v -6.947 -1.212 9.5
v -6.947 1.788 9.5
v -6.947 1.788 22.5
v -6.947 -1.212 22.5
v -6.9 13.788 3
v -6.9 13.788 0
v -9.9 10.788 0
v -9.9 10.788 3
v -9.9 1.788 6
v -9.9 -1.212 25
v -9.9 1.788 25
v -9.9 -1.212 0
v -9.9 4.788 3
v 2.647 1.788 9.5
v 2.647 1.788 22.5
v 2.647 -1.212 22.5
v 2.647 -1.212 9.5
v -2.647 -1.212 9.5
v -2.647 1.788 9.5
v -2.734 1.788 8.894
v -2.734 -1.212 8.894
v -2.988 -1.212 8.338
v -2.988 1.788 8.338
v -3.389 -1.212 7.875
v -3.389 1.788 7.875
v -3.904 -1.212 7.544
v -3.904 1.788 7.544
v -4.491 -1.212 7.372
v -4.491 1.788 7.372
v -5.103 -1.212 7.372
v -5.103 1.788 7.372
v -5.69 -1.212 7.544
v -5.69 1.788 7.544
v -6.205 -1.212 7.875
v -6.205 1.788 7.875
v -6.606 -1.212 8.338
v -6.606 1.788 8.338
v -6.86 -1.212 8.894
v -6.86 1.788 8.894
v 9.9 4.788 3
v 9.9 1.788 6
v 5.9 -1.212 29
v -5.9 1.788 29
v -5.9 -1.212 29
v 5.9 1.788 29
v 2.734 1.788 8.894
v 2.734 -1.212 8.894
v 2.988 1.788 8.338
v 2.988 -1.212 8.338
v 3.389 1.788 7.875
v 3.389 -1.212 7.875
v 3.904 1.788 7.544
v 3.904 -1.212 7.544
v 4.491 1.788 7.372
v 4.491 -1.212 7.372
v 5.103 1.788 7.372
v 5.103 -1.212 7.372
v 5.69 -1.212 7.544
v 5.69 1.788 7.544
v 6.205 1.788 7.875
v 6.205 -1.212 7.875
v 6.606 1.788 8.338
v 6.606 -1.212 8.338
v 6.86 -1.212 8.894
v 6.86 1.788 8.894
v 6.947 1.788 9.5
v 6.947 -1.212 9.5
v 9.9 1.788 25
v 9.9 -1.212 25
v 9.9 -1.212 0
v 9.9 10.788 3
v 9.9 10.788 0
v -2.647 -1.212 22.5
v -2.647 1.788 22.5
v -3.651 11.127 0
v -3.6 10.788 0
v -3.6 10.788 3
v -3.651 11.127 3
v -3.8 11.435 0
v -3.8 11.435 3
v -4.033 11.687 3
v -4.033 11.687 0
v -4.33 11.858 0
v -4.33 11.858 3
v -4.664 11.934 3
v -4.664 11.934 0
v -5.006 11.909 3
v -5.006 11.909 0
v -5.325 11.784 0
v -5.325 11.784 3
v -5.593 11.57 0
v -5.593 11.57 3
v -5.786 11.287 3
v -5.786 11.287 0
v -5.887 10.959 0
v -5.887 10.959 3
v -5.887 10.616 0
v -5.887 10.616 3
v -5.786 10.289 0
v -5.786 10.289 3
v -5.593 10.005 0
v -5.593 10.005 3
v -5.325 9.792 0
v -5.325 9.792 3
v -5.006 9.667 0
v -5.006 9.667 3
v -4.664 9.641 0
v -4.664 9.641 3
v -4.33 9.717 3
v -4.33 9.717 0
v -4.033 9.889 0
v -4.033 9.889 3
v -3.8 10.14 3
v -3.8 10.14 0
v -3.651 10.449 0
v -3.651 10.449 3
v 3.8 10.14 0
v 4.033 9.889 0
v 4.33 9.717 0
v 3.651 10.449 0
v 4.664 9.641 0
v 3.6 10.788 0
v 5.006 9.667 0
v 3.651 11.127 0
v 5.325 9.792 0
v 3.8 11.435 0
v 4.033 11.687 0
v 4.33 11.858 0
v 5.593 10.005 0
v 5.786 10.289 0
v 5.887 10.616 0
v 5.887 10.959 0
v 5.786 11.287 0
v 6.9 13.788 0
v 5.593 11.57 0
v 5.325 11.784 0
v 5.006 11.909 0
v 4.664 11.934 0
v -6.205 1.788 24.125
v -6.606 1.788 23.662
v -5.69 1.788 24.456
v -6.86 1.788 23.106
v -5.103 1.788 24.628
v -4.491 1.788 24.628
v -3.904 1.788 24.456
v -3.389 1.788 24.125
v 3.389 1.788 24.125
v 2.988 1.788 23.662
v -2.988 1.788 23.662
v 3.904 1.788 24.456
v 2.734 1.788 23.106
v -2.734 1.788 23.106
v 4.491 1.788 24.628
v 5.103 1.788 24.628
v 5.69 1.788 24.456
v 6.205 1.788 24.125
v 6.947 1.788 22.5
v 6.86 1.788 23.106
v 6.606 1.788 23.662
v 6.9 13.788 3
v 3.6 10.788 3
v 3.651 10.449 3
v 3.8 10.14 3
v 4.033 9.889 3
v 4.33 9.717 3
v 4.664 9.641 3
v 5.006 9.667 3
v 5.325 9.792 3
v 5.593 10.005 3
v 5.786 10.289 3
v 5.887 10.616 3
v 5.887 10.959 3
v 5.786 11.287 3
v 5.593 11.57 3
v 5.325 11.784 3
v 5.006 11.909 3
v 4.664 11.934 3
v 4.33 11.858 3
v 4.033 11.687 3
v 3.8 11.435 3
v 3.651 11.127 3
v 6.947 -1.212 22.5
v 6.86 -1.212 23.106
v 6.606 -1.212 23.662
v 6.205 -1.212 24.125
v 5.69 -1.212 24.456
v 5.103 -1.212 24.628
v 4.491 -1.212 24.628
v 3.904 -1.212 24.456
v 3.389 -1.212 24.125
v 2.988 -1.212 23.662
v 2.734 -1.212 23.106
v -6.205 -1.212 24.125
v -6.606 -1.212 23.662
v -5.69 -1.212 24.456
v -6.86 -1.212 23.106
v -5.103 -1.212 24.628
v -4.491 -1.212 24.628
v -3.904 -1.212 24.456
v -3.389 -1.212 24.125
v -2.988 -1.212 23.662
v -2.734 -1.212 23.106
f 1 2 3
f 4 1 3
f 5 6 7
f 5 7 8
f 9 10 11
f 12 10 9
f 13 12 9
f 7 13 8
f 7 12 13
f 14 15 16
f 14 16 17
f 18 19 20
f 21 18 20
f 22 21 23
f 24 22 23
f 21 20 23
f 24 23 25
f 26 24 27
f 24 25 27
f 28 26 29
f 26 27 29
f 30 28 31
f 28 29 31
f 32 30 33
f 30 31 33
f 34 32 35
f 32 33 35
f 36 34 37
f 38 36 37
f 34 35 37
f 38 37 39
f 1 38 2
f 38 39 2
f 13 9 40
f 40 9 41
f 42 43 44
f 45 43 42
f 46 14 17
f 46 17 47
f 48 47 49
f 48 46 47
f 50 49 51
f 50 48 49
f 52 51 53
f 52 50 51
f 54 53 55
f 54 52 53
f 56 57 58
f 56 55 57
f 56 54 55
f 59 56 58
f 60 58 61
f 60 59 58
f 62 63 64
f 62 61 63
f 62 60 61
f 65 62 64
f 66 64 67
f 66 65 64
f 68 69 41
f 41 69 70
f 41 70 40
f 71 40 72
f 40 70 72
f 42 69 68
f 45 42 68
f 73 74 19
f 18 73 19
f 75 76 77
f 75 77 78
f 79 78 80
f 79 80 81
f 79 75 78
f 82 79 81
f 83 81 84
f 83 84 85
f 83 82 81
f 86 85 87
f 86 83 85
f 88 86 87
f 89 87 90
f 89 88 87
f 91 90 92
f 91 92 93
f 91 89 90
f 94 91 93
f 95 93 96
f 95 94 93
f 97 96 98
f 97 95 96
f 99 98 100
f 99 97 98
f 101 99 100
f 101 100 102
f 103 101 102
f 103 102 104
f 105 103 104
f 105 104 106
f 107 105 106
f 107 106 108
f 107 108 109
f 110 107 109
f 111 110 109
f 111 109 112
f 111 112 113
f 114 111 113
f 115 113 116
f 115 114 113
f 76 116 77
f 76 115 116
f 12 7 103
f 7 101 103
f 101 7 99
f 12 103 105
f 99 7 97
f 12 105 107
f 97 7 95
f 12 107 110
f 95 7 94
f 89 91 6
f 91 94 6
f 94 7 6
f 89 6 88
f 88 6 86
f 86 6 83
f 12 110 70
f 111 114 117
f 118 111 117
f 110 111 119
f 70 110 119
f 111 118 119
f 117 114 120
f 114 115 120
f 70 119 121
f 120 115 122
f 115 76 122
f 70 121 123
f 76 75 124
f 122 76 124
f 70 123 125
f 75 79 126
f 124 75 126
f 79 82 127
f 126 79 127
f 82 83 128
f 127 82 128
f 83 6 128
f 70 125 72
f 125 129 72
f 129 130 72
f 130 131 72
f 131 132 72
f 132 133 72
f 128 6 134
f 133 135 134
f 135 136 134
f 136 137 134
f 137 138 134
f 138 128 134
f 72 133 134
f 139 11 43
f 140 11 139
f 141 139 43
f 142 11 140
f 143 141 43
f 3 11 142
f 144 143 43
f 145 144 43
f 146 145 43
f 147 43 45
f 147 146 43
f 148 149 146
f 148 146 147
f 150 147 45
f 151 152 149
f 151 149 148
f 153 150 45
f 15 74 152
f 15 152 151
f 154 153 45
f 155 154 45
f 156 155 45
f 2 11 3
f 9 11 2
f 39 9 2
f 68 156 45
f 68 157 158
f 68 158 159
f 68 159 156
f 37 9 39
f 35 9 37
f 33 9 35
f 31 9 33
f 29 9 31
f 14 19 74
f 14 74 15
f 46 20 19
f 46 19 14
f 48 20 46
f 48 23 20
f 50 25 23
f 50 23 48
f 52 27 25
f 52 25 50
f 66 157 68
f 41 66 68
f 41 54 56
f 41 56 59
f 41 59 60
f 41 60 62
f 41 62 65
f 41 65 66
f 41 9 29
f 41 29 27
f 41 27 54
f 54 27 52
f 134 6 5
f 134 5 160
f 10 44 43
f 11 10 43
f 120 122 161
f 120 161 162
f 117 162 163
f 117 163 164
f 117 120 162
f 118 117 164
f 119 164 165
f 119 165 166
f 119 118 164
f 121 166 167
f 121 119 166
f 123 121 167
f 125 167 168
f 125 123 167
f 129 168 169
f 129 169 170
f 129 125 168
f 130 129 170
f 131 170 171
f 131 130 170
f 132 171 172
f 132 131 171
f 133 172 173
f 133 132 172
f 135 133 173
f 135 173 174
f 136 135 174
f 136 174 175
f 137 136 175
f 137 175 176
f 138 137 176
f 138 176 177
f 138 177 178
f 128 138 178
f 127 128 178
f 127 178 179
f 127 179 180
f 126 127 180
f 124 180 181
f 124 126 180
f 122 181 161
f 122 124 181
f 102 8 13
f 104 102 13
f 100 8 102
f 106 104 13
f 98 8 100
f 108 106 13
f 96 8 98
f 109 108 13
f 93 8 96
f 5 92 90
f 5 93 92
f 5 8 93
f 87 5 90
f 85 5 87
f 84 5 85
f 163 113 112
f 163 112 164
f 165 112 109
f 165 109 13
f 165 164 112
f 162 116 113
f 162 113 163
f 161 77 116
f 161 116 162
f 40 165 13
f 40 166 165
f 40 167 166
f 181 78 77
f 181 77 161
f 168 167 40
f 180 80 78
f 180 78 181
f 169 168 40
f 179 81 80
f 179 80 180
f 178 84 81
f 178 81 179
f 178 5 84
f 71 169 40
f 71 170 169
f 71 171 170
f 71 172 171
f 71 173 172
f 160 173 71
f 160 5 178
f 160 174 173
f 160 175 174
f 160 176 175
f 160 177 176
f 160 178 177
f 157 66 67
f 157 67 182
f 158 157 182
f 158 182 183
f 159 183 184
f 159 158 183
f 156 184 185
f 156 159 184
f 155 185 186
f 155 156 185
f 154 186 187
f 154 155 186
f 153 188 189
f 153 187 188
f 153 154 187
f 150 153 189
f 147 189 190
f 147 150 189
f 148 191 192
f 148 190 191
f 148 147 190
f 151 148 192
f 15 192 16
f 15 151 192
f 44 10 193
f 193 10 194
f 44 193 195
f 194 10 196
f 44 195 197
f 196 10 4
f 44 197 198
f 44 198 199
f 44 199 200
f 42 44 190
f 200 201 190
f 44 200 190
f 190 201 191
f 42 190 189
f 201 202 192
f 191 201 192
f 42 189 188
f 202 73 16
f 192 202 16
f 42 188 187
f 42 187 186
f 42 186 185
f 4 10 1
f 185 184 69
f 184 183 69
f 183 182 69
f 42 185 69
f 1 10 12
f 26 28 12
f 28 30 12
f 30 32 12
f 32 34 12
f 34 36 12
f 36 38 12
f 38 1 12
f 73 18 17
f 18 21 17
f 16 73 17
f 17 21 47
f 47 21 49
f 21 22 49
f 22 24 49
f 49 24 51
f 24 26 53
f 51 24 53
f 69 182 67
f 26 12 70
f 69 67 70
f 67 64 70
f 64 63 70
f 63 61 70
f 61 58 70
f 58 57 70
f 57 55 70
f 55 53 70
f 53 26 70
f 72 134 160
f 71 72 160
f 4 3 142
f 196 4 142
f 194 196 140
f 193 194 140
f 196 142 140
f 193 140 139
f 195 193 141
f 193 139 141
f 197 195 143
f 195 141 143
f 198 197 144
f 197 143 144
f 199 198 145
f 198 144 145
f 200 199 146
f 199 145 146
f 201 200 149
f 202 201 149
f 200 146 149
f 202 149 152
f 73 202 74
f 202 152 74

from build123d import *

# Parameters (mm, degrees)
SKETCH1_W           = 19.8
SKETCH1_H           = 15
SKETCH1_R           = 1.15
BOSS_EXTRUDE1_DEPTH = 3
SKETCH2_W           = 19.8
SKETCH2_H           = 3
BOSS_EXTRUDE2_DEPTH = 26
CHAMFER1_SIZE       = 3
CUT_EXTRUDE1_DEPTH  = 15
CHAMFER2_SIZE       = 4


with BuildPart() as part:
    # Sketch1 → Boss-Extrude1 (new body)
    with BuildSketch(Plane.XY):
        with Locations((0, 6.287671233)):
            Rectangle(SKETCH1_W, SKETCH1_H)
        with Locations((-4.75, 10.787671233)):
            Circle(SKETCH1_R, mode=Mode.SUBTRACT)
        with Locations(Location((4.75, 10.787671233, 0), (0, 0, 180))):
            Circle(SKETCH1_R, mode=Mode.SUBTRACT)
    extrude(amount=BOSS_EXTRUDE1_DEPTH)

    # Sketch2 → Boss-Extrude2 (add)
    with BuildSketch(Plane.XY.offset(3)):
        with Locations((0, 0.287671233)):
            Rectangle(SKETCH2_W, SKETCH2_H)
    extrude(amount=BOSS_EXTRUDE2_DEPTH)

    # Chamfer1
    chamfer1_edges = [part.edges().sort_by_distance(p)[0] for p in [
        (0, 1.787671233, 3),
        (-9.9, 13.787671233, 1.5),
        (9.9, 13.787671233, 1.5),
    ]]
    chamfer(chamfer1_edges, length=CHAMFER1_SIZE)

    # Sketch4 → Cut-Extrude1 (cut)
    with BuildSketch(Plane(origin=(0, 1.787671233, 0), x_dir=(1, 0, 0), z_dir=(0, 1, 0))):
        with BuildLine():
            Line((2.647058824, -22.5), (2.647058824, -9.5))
            ThreePointArc((2.647058824, -9.5), (4.797058824, -7.35), (6.947058824, -9.5))
            Line((6.947058824, -9.5), (6.947058824, -22.5))
            ThreePointArc((6.947058824, -22.5), (4.797058824, -24.65), (2.647058824, -22.5))
        make_face()
        with BuildLine():
            Line((-2.647058824, -22.5), (-2.647058824, -9.5))
            ThreePointArc((-2.647058824, -9.5), (-4.797058824, -7.35), (-6.947058824, -9.5))
            Line((-6.947058824, -9.5), (-6.947058824, -22.5))
            ThreePointArc((-6.947058824, -22.5), (-4.797058824, -24.65), (-2.647058824, -22.5))
        make_face()
    extrude(amount=-CUT_EXTRUDE1_DEPTH, mode=Mode.SUBTRACT)

    # Chamfer2
    chamfer2_edges = [part.edges().sort_by_distance(p)[0] for p in [
        (-9.9, 0.287671233, 29),
        (9.9, 0.287671233, 29),
    ]]
    chamfer(chamfer2_edges, length=CHAMFER2_SIZE)


solid = part.part
